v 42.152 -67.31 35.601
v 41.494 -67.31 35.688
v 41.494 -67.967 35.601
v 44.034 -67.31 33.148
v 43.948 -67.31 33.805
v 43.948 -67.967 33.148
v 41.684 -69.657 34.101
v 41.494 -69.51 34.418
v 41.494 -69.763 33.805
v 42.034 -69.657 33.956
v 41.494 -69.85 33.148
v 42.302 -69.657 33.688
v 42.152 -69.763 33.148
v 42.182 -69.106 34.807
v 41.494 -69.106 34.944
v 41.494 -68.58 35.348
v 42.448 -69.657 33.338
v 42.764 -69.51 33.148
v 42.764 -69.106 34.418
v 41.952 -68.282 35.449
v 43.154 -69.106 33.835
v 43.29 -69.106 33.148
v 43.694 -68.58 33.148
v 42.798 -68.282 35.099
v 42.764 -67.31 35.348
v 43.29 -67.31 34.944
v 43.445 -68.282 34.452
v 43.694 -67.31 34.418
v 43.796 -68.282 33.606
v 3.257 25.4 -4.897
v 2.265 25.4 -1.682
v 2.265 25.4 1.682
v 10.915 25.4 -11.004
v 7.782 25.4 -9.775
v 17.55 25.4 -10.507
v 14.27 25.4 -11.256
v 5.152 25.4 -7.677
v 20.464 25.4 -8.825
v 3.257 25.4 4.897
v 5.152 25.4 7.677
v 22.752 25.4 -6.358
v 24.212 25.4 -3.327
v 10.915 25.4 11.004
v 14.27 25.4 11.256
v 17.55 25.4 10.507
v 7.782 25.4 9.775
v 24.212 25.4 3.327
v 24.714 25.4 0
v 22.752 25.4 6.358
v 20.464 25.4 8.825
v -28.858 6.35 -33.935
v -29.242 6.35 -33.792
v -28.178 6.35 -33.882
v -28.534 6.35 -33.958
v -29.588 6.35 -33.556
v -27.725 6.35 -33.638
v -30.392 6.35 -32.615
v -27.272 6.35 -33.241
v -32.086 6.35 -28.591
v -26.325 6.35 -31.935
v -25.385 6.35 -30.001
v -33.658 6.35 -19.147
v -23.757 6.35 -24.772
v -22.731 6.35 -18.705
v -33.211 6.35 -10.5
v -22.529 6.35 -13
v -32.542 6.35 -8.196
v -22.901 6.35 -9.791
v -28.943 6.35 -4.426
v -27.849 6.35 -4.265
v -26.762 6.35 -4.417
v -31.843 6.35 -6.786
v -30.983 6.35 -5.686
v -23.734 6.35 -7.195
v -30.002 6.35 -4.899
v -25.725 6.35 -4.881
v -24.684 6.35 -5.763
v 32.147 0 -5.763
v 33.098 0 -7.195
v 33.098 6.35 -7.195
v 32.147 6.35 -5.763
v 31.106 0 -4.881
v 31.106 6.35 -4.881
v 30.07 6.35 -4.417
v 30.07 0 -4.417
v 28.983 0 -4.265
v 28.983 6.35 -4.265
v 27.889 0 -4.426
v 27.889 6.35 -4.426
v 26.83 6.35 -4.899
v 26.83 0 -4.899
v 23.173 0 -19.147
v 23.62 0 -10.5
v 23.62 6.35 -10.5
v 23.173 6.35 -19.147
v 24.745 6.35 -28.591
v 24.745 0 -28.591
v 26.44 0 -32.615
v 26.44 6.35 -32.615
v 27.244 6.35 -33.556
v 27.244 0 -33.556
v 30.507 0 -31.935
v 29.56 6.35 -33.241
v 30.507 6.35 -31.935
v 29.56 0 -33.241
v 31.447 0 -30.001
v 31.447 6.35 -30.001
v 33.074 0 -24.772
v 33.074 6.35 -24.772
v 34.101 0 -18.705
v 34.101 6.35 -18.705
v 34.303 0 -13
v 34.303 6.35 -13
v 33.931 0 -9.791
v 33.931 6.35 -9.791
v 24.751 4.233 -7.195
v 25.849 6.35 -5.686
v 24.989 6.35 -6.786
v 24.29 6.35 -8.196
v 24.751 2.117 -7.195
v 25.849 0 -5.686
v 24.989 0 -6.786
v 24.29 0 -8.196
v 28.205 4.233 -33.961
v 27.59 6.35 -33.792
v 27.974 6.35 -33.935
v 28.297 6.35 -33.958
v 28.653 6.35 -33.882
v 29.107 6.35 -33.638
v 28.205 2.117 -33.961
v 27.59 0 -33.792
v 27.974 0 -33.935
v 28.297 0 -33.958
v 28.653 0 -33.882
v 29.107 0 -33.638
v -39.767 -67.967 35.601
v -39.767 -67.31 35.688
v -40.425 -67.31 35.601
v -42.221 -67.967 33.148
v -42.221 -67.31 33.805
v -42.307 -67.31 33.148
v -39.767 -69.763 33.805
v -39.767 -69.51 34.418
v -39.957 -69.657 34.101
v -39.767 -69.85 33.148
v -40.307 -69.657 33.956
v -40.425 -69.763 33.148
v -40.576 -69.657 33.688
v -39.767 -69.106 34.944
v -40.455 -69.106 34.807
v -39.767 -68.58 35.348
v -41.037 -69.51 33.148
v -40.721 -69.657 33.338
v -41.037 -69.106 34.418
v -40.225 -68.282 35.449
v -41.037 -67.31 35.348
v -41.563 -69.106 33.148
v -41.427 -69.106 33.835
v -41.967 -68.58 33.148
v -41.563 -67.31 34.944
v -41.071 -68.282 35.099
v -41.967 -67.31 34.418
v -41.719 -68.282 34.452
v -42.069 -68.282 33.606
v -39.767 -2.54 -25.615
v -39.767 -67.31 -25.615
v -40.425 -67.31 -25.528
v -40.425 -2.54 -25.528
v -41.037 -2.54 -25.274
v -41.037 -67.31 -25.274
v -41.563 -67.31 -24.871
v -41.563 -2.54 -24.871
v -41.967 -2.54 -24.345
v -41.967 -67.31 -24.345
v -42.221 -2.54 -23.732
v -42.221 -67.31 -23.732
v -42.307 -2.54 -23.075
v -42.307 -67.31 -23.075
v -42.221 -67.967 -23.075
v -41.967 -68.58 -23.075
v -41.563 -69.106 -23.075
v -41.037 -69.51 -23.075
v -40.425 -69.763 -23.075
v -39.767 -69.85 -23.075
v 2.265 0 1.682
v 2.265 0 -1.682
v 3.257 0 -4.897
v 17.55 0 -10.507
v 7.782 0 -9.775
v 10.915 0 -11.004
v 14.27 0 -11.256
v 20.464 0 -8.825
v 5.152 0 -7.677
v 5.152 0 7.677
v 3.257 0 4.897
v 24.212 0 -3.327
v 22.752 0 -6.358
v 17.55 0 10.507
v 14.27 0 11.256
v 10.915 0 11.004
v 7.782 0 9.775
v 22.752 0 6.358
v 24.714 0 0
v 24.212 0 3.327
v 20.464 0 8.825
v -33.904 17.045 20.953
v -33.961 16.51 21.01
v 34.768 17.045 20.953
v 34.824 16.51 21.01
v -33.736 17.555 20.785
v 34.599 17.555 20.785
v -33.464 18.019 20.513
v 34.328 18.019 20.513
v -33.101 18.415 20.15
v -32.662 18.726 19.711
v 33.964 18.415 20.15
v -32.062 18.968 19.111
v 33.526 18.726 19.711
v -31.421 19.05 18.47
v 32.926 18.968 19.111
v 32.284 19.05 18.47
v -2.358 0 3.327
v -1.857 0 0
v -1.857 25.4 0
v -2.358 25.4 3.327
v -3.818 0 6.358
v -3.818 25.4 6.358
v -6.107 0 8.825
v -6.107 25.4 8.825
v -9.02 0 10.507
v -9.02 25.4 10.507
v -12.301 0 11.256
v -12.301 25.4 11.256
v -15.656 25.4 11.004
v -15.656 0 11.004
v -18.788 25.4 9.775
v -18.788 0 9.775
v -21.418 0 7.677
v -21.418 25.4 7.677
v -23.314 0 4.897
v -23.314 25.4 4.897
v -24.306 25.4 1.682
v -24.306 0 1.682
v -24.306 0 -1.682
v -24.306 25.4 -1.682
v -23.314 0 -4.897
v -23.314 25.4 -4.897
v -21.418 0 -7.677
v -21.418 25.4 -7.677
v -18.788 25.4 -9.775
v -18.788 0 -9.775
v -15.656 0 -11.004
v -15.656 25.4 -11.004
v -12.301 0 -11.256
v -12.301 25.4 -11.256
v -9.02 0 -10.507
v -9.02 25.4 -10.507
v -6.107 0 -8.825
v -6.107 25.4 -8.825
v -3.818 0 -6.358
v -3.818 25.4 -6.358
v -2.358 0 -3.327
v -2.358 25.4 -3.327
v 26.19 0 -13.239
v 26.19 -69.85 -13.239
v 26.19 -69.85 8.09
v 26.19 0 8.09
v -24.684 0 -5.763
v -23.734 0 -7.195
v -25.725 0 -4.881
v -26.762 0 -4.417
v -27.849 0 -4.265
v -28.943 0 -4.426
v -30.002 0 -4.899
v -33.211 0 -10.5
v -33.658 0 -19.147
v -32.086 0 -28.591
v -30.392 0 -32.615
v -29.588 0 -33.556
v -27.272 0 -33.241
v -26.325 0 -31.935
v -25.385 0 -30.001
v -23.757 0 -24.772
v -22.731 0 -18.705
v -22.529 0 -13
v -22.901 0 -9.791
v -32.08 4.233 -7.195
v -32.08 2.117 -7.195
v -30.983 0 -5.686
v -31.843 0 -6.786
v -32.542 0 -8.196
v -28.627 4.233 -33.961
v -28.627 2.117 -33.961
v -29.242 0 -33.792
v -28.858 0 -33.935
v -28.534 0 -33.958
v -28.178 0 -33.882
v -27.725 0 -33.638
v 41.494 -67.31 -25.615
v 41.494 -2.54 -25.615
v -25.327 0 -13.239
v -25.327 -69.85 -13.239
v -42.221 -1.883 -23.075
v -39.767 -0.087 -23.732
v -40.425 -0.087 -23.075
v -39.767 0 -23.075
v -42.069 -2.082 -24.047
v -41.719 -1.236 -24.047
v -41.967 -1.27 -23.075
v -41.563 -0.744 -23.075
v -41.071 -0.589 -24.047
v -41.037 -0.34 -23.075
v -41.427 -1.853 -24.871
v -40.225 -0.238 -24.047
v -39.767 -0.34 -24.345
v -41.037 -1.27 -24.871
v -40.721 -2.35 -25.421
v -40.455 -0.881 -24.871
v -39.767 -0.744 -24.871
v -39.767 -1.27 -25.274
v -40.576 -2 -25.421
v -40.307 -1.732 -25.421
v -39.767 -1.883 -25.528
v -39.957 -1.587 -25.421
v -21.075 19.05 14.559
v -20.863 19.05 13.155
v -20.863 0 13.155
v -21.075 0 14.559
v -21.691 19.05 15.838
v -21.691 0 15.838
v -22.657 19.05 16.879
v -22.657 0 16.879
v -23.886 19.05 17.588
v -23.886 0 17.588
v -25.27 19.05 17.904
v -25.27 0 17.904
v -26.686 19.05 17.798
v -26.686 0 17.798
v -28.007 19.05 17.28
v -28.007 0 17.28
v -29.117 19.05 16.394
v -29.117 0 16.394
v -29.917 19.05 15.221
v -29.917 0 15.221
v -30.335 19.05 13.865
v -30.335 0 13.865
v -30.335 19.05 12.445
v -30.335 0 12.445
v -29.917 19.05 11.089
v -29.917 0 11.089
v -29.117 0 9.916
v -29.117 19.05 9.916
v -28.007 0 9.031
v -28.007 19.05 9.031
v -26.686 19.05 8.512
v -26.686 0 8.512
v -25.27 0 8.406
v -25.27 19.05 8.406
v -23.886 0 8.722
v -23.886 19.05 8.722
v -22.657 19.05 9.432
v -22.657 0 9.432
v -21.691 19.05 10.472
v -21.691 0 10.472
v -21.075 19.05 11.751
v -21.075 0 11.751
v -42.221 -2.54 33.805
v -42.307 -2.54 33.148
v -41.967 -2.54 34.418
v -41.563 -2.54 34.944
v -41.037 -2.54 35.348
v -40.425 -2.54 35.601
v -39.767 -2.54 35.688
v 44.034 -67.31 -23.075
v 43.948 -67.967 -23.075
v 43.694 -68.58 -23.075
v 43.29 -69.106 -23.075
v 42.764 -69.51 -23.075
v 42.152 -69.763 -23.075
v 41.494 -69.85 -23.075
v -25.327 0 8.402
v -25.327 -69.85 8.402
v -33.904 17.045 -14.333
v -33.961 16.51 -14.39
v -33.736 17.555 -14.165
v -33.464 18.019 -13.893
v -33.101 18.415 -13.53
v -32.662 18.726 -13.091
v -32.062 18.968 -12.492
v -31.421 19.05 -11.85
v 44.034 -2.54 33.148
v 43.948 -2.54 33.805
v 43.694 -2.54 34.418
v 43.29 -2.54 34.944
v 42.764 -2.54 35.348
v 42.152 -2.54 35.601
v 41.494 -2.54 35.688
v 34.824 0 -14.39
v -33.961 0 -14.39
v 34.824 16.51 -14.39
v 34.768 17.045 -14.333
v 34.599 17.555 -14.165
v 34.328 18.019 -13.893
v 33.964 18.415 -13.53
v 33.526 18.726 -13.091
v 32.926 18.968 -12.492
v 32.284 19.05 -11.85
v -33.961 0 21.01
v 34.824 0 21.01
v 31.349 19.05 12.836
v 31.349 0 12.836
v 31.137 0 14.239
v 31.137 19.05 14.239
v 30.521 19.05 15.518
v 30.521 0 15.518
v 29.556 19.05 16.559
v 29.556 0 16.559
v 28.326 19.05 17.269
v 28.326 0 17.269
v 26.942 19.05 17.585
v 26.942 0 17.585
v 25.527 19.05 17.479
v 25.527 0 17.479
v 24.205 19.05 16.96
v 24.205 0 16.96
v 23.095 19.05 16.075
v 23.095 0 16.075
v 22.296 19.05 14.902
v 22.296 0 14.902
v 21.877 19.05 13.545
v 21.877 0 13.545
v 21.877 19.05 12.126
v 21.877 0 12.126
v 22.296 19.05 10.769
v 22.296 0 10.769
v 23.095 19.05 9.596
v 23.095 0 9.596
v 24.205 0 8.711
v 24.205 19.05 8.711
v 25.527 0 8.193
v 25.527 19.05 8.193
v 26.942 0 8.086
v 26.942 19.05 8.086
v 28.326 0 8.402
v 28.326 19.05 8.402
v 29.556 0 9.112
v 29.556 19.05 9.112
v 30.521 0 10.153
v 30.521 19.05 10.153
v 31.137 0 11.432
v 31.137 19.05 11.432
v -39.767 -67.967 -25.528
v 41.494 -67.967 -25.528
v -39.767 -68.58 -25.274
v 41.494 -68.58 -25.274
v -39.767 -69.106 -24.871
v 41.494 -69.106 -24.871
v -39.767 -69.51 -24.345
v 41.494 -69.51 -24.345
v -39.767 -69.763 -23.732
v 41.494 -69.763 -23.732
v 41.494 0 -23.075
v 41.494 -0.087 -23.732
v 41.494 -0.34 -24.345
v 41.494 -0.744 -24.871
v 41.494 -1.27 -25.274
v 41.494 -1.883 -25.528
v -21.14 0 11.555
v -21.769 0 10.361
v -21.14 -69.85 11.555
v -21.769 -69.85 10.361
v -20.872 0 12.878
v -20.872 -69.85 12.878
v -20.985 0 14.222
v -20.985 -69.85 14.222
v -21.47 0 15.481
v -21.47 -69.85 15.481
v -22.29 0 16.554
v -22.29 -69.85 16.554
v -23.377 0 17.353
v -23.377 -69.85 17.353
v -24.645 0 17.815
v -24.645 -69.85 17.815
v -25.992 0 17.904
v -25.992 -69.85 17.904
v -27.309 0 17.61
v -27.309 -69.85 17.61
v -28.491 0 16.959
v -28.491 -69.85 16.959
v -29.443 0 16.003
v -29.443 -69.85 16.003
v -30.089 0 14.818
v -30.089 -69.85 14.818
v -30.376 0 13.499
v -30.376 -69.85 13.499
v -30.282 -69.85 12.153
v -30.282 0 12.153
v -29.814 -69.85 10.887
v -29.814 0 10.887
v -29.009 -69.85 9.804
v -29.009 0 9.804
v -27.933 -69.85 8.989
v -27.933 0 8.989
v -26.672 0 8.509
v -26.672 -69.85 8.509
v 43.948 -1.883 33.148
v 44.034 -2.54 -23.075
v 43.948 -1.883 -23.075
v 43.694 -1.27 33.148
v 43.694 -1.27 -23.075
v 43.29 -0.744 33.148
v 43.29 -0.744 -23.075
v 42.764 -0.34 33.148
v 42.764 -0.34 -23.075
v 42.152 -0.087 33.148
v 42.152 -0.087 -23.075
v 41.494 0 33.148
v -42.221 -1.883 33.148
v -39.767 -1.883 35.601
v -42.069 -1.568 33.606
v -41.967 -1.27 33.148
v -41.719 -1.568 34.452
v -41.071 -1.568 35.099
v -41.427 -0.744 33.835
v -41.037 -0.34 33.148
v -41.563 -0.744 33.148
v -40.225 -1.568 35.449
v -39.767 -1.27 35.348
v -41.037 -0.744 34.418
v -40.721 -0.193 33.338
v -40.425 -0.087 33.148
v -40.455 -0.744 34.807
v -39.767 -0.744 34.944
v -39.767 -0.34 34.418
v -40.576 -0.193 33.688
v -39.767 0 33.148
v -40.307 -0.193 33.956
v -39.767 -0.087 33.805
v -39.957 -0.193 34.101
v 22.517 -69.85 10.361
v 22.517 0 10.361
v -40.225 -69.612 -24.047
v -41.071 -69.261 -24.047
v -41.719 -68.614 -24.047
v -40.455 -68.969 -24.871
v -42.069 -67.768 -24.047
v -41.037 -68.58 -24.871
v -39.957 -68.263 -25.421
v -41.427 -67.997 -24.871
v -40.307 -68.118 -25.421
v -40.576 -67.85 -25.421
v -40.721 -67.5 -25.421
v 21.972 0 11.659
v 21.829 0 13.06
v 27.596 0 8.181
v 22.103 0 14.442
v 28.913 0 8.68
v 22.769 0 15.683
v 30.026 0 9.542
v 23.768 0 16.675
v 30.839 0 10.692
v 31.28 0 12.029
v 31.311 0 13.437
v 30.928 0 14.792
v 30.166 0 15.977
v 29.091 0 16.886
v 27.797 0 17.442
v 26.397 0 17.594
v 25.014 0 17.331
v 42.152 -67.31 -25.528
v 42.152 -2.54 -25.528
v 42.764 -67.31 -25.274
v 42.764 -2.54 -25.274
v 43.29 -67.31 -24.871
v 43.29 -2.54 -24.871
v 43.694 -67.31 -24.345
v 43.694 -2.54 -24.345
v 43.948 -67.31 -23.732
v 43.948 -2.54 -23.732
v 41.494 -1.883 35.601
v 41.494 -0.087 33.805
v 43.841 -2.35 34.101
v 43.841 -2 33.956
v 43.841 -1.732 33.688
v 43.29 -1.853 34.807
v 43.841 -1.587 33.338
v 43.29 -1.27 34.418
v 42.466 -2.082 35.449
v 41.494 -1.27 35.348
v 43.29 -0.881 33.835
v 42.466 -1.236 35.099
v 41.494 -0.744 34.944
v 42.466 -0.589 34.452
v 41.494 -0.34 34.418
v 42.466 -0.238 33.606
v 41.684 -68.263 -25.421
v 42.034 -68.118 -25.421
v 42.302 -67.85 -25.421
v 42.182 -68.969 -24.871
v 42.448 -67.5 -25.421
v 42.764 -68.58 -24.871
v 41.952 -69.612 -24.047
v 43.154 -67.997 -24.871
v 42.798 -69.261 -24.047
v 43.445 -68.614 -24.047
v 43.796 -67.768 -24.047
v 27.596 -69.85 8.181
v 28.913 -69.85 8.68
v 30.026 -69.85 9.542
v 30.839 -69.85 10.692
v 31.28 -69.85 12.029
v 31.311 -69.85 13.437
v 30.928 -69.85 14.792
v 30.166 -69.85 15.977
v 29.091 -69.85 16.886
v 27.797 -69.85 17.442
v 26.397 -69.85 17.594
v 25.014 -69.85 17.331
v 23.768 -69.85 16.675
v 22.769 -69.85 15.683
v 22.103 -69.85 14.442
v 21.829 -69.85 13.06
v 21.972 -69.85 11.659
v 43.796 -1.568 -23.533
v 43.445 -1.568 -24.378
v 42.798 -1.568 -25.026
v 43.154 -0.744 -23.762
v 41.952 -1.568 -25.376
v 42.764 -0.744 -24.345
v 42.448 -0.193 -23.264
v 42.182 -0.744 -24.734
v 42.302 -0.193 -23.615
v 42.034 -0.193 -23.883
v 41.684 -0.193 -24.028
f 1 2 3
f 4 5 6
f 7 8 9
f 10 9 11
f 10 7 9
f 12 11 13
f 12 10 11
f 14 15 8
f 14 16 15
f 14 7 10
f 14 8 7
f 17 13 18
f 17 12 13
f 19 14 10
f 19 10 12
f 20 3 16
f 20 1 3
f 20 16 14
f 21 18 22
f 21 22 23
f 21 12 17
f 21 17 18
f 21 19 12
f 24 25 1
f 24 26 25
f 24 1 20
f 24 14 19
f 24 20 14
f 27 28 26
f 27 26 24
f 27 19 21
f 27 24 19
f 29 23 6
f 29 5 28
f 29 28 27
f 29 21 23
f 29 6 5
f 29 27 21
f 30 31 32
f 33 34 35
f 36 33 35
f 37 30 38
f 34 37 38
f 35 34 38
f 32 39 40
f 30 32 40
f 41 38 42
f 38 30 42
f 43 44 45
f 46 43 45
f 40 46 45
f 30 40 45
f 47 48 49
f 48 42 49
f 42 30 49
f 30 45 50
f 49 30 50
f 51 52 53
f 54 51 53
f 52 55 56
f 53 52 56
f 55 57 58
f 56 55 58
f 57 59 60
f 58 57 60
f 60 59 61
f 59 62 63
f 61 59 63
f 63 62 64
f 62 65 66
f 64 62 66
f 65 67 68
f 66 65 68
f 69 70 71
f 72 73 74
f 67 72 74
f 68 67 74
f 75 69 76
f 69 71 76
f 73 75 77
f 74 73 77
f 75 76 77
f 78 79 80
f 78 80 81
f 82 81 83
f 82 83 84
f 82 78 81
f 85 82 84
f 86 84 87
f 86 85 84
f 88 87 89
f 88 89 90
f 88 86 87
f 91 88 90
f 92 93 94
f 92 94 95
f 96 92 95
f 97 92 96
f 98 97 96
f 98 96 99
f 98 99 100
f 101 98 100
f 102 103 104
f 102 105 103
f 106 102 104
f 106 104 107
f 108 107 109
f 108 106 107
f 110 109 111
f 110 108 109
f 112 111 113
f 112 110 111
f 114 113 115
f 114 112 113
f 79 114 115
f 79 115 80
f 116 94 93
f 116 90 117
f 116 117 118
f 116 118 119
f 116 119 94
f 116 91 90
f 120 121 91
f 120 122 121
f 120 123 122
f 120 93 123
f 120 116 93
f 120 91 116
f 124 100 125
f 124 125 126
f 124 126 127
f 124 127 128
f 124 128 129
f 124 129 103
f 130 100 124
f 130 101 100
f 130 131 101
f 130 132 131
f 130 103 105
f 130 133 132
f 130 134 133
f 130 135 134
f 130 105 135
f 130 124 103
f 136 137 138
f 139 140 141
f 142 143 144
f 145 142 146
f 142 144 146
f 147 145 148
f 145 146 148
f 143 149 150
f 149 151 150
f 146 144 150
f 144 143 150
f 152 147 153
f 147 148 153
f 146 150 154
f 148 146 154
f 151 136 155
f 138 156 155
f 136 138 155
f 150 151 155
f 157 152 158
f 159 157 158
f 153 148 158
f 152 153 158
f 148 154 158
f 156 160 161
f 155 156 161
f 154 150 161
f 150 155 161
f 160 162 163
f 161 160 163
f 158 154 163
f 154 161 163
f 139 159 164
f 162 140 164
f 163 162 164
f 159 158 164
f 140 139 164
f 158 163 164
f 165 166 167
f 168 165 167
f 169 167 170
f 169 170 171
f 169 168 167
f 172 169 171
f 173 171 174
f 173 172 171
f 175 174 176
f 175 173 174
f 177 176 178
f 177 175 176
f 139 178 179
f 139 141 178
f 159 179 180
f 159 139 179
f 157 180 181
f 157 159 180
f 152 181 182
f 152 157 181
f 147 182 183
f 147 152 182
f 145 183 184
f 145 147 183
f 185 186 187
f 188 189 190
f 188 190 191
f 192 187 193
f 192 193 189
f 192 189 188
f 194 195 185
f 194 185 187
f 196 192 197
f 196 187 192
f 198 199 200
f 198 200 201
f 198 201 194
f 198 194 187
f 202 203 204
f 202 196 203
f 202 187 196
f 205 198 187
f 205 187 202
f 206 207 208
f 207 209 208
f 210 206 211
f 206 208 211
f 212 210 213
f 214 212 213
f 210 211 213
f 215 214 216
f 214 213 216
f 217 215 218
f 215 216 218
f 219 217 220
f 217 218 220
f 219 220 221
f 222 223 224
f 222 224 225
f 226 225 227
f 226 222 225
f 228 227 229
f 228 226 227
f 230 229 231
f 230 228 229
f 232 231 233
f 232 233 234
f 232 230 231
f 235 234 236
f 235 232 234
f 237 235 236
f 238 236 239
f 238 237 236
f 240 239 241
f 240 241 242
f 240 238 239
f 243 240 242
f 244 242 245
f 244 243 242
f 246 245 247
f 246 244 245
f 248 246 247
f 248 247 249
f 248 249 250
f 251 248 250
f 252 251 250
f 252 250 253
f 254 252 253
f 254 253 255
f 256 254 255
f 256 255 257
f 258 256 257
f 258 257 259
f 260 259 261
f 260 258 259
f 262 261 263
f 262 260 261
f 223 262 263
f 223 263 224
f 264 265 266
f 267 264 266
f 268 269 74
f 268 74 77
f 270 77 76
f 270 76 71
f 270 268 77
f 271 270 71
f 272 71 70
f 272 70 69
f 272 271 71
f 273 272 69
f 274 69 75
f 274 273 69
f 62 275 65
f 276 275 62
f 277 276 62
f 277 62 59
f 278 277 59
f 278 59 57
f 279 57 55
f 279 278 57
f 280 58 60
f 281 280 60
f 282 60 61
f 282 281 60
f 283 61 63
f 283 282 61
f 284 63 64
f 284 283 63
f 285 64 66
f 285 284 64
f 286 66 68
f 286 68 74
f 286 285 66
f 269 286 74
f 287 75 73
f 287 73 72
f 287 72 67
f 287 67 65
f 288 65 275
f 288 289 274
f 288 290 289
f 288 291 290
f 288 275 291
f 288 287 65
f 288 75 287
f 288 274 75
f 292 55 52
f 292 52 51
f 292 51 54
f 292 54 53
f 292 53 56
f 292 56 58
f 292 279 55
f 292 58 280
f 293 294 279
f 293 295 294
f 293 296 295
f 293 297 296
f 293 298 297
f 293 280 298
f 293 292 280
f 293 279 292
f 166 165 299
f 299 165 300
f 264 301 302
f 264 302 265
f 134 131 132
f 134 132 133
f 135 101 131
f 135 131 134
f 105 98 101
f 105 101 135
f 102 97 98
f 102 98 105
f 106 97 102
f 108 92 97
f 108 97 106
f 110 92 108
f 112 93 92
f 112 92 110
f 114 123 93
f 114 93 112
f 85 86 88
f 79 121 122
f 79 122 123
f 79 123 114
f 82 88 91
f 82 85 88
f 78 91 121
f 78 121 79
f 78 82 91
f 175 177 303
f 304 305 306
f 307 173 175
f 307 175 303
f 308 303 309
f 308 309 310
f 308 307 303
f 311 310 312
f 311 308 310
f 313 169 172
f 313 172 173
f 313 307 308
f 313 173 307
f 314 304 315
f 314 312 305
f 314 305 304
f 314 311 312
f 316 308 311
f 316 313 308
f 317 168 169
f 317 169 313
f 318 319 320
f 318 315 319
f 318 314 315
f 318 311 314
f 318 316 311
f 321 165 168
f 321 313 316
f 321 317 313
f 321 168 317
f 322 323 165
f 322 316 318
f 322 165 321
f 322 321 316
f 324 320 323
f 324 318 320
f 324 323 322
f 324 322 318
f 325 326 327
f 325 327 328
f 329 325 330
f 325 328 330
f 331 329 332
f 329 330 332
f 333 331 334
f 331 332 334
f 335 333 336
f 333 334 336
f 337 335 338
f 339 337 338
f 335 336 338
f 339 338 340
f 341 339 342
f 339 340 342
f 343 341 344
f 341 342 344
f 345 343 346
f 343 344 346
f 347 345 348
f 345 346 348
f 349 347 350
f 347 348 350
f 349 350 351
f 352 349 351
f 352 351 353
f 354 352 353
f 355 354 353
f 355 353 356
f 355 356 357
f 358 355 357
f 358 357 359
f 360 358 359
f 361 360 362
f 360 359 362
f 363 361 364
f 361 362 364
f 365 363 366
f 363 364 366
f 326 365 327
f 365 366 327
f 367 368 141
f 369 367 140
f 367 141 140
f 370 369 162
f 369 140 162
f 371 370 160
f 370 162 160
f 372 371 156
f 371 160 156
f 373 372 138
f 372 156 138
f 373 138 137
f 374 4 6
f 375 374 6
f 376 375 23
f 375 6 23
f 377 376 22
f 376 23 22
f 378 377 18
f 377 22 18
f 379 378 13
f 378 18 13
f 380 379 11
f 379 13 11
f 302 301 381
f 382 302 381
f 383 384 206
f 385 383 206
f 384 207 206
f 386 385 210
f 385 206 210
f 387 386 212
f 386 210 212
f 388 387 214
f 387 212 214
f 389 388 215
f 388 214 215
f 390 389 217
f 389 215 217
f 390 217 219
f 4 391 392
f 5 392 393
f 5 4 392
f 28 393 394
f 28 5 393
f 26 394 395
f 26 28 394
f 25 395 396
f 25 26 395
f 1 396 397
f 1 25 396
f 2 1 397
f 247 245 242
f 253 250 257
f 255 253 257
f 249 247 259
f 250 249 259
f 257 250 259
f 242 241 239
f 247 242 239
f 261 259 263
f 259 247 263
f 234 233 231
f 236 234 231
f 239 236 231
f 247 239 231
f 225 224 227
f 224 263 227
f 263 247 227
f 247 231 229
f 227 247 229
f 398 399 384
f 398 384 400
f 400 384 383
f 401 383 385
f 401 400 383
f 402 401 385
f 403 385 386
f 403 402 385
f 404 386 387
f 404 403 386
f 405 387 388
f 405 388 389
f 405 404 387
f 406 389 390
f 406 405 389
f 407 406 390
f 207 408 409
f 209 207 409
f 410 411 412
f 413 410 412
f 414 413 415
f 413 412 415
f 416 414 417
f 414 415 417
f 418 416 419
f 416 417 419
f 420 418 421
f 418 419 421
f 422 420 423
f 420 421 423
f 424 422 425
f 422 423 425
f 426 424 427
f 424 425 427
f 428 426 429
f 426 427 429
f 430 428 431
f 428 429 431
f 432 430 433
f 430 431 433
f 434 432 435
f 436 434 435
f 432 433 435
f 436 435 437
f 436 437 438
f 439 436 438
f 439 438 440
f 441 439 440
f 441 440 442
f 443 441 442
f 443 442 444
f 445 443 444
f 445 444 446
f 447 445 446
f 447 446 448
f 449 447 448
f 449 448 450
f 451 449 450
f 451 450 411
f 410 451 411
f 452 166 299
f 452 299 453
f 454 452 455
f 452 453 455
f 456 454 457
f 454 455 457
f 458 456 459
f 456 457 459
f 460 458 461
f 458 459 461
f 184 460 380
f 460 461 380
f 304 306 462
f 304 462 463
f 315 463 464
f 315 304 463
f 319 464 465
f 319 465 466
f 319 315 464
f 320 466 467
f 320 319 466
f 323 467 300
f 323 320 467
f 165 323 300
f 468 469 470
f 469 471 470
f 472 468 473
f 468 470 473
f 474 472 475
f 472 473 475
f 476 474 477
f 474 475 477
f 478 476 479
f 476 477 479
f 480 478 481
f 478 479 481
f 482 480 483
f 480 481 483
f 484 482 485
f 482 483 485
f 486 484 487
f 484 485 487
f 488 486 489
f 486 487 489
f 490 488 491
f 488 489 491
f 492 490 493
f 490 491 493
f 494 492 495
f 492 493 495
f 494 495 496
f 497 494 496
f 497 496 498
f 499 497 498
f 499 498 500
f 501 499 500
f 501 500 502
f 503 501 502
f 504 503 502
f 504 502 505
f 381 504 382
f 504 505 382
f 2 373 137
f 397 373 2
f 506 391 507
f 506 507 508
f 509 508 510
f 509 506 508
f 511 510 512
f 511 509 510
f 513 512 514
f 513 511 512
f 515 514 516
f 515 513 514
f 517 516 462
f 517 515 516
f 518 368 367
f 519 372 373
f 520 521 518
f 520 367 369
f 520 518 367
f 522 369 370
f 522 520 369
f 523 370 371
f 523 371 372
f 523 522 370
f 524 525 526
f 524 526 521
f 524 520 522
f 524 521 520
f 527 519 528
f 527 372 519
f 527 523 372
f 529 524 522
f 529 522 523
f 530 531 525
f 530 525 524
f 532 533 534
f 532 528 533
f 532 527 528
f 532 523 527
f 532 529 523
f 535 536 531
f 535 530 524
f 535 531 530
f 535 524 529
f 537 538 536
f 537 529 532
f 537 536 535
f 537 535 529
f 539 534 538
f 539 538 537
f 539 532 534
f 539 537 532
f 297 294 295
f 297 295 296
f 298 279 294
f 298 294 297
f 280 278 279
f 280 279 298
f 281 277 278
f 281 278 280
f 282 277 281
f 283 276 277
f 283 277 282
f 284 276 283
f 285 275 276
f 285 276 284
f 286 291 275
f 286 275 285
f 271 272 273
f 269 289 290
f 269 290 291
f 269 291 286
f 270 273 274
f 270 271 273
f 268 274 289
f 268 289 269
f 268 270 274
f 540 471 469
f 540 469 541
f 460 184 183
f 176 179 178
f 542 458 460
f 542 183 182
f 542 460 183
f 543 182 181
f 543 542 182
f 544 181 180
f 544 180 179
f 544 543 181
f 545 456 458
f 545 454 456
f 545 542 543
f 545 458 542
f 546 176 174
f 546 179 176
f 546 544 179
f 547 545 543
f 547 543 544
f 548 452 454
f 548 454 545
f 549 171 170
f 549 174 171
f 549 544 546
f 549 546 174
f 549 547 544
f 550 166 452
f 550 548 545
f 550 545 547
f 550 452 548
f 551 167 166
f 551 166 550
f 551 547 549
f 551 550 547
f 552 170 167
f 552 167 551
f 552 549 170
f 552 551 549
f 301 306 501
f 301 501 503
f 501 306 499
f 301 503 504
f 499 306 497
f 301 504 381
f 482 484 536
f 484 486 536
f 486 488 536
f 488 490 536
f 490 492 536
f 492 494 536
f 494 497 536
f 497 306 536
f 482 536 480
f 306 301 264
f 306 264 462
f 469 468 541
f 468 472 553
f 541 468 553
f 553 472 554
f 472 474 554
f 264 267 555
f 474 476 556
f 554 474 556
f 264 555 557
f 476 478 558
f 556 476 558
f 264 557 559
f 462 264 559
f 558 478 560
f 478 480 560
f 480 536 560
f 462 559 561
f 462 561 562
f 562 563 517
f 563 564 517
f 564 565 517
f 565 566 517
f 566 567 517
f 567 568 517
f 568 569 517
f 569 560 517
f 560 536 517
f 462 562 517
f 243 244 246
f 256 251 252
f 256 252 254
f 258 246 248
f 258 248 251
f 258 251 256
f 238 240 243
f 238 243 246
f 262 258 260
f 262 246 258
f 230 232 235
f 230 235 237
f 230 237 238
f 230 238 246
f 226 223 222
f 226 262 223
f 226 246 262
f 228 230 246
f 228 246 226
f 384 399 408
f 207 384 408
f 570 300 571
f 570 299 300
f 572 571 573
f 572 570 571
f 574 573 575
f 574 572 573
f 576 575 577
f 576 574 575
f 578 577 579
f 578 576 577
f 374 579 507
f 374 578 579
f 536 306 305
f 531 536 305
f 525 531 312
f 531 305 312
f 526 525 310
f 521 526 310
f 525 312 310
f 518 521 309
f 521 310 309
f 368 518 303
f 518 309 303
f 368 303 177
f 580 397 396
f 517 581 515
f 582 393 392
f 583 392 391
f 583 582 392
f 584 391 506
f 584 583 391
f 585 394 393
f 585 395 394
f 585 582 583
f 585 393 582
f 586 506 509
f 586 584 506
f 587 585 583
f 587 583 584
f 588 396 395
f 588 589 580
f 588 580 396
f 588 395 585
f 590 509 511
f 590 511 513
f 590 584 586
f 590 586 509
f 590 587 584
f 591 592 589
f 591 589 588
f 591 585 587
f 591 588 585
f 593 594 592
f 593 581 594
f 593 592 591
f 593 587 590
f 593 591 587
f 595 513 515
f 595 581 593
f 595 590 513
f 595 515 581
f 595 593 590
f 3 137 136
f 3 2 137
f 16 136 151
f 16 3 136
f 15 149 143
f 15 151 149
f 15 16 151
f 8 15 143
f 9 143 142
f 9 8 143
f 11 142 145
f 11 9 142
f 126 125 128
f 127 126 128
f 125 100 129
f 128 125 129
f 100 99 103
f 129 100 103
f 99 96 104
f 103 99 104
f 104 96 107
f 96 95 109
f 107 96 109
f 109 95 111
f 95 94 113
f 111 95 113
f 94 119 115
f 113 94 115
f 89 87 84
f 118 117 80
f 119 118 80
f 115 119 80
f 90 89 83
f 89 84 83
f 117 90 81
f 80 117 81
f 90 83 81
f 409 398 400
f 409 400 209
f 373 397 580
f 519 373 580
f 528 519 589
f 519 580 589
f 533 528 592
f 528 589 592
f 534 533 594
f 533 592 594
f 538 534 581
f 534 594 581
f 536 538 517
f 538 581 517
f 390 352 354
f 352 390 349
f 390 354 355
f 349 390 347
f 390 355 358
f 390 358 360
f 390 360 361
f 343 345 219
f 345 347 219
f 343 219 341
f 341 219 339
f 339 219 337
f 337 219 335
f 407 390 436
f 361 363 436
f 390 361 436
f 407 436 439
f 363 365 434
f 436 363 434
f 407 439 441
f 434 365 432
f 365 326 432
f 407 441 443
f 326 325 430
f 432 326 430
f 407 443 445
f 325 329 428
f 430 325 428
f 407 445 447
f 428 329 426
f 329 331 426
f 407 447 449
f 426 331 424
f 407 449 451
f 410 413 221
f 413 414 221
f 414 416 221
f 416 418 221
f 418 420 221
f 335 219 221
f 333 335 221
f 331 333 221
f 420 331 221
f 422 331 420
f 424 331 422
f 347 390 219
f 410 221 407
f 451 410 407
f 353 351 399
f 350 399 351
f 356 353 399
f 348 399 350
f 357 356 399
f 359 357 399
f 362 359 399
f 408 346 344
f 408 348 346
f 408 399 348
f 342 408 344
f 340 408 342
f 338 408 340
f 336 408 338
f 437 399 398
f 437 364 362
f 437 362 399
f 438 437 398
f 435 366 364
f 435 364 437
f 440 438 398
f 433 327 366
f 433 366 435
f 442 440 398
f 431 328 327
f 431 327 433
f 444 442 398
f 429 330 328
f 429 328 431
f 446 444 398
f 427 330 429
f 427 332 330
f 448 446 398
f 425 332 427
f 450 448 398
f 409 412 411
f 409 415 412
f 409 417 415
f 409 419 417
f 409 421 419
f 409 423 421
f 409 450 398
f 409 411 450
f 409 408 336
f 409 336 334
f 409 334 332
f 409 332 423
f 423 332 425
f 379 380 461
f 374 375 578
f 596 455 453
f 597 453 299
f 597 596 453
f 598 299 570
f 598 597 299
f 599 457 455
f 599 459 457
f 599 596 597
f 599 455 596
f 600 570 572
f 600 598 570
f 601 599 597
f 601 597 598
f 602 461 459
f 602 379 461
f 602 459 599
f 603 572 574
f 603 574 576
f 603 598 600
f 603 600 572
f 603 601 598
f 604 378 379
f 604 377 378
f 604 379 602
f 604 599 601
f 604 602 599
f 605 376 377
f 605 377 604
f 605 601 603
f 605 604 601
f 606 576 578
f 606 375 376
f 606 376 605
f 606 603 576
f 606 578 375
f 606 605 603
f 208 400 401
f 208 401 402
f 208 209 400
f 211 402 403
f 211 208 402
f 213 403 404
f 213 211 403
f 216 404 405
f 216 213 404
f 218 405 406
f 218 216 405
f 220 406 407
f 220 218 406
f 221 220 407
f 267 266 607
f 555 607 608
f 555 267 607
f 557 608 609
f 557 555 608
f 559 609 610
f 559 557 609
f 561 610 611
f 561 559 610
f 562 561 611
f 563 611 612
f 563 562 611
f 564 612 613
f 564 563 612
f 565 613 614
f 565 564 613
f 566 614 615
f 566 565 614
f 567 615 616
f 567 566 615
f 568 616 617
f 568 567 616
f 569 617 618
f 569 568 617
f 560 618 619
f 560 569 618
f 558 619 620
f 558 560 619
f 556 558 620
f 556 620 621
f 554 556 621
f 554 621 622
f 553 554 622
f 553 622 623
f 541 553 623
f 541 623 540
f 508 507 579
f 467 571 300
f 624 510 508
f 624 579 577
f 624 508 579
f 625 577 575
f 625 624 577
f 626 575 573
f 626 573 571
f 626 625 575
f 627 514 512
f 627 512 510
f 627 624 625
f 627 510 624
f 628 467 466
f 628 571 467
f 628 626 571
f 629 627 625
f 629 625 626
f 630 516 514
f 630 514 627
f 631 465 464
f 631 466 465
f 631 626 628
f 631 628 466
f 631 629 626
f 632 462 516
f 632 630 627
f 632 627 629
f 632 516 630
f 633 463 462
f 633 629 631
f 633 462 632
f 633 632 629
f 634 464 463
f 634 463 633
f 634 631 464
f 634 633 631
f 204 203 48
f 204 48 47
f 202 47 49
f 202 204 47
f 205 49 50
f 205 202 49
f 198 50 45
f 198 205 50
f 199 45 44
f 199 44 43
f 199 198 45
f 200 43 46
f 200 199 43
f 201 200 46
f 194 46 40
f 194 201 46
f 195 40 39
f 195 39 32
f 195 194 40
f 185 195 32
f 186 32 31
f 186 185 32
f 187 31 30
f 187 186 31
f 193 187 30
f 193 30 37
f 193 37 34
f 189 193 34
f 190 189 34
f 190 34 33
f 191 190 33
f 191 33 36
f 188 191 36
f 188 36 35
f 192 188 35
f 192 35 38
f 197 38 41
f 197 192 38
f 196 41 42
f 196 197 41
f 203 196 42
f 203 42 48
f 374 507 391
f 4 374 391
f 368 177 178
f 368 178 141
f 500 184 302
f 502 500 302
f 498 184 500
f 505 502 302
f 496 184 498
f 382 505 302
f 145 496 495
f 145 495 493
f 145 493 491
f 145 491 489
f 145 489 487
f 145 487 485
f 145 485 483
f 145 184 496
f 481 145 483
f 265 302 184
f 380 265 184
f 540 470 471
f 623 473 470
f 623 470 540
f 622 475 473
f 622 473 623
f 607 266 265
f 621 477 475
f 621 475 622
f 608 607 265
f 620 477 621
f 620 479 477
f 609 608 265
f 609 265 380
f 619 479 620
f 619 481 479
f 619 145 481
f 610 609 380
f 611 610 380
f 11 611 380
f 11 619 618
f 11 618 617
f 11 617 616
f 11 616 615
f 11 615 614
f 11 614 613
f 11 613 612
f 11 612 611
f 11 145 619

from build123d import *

# Parameters (mm, degrees)
F1_W          = 86.341727525
F1_H          = 61.3026246428
F2_DEPTH      = 69.85
F0_R          = 11.2874637249
F5_DEPTH      = 25.4
F6_DEPTH      = 6.35
F3_W          = 68.7855817378
F3_H          = 35.4001102969
F7_DEPTH      = 19.05
F8_R          = 2.54
F8_2_R        = 2.54
F9_T1_DEPTH   = 65.1126246428
F9_T3_DEPTH   = 90.151727525
F9_S7_W       = 2.54
F9_S7_H       = 2.54
F9_T8_DEPTH   = 2.54
F9_S13_W      = 2.54
F9_S13_H      = 2.54
F9_T14_DEPTH  = 2.54
F10_T1_DEPTH  = 64.77
F10_S5_W      = 2.54
F10_S5_H      = 2.54
F10_T6_DEPTH  = 2.54
F10_S11_W     = 2.54
F10_S11_H     = 2.54
F10_T12_DEPTH = 2.54
F11_R         = 4.7625
F12_DEPTH     = 279.4
F13_W         = 51.5172332525
F13_H         = 23.6000707373
F14_DEPTH     = 101.6


# Not quite as in the source:
# - a fillet or chamfer that OpenCascade refuses, or shapes differently, is made with other operations: its cross-section is extruded or revolved along the edge and cut away or added


with BuildPart() as f2:
    # F1 (on Front) → F2 (new body)
    with BuildSketch(Plane.XZ):
        with Locations((0.8634161204, 5.0365999341)):
            Rectangle(F1_W, F1_H)
    extrude(amount=F2_DEPTH)

    # F8
    f8_edges = [f2.edges().sort_by_distance(p)[0] for p in [
        (-42.307448, -34.925, 35.687912),
        (0.863416, 0, 35.687912),
        (44.03428, -34.925, 35.687912),
        (0.863416, -69.85, 35.687912),
        (44.03428, -69.85, 5.0366),
        (-42.307448, -69.85, 5.0366),
        (0.863416, -69.85, -25.614712),
        (44.03428, -34.925, -25.614712),
        (44.03428, 0, 5.0366),
    ]]
    fillet(f8_edges, radius=F8_R)

    # F9: fillet of radius 2.54 on 2 edges, made by hand

    # F9_s2 → F9_t1 (cut)
    with BuildSketch(Plane.XY.offset(-31.9647123873)):
        with BuildLine():
            ThreePointArc((-39.7674476421, 0), (-41.5634988663, -0.7439487758), (-42.3074476421, -2.54))
            Line((-42.3074476421, -2.54), (-42.3074476421, 0))
            Line((-42.3074476421, 0), (-39.7674476421, 0))
        make_face()
    extrude(amount=F9_T1_DEPTH, mode=Mode.SUBTRACT)

    # F9_s4 → F9_t3 (cut)
    with BuildSketch(Plane.YZ.offset(-48.6574476421)):
        with BuildLine():
            ThreePointArc((0, -23.0747123873), (-0.7439487758, -24.8707636115), (-2.54, -25.6147123873))
            Line((-2.54, -25.6147123873), (0, -25.6147123873))
            Line((0, -25.6147123873), (0, -23.0747123873))
        make_face()
    extrude(amount=F9_T3_DEPTH, mode=Mode.SUBTRACT)


with BuildPart() as f5:
    # F0 (on Front) → F5 (new body)
    with BuildSketch(Plane.XZ):
        with Locations((-13.1441846499, 0)):
            Circle(F0_R)
    extrude(amount=-F5_DEPTH)


with BuildPart() as f5b:
    # F0 (on Front) → F5, piece 2 (new body)
    with BuildSketch(Plane.XZ):
        with Locations((13.4262019347, 0)):
            Circle(F0_R)
    extrude(amount=-F5_DEPTH)


with BuildPart() as f6:
    # F4 (on Front) → F6 (new body)
    with BuildSketch(Plane.XZ):
        with BuildLine():
            add(Edge.make_bspline(
                [(33.0976620317, -7.1951444261), (31.1890209887, -3.2906266132), (19.0840525939, -3.2757250199), (27.6928798629, -53.6869881743), (36.5438211862, -14.2449717651), (33.0976620317, -7.1951444261)],
                knots=[0, 0, 0, 0, 0.2172144581, 0.6078070332, 1, 1, 1, 1], degree=3))
        make_face()
    extrude(amount=-F6_DEPTH)


with BuildPart() as f6b:
    # F4 (on Front) → F6, piece 2 (new body)
    with BuildSketch(Plane.XZ):
        with BuildLine():
            add(Edge.make_bspline(
                [(-23.7341076136, -7.1951444261), (-25.6427486565, -3.2906266132), (-37.7477170514, -3.2757250199), (-29.1388897823, -53.6869881743), (-20.287948459, -14.2449717651), (-23.7341076136, -7.1951444261)],
                knots=[0, 0, 0, 0, 0.2172144581, 0.6078070332, 1, 1, 1, 1], degree=3))
        make_face()
    extrude(amount=-F6_DEPTH)


with BuildPart() as f7:
    # F3 (on Front) → F7 (new body)
    with BuildSketch(Plane.XZ):
        with Locations((0.4317071289, 3.3097662963)):
            Rectangle(F3_W, F3_H)
    extrude(amount=-F7_DEPTH)

    # F8#2
    f8_2_edges = [f7.edges().sort_by_distance(p)[0] for p in [
        (0.431707, 19.05, 21.009821),
        (-33.961084, 19.05, 3.309766),
        (0.431707, 19.05, -14.390289),
        (34.824498, 19.05, 3.309766),
    ]]
    fillet(f8_2_edges, radius=F8_2_R)


with BuildPart() as f9_tool6:
    # F9_s7 → F9_t8 (new body)
    with BuildSketch(Plane.XZ.offset(2.54)):
        with Locations((42.7642798829, -24.3447123873)):
            Rectangle(F9_S7_W, F9_S7_H)
    extrude(amount=-F9_T8_DEPTH)

    # F9_s9 → F9_t10 (revolve, cut)
    with BuildSketch(Plane(origin=(41.4942798829, -2.54, -23.0747123873), x_dir=(-0.7071067812, 0, 0.7071067812), z_dir=(-0.7071067812, 0, -0.7071067812))):
        with BuildLine():
            ThreePointArc((0, -2.54), (2.54, 0), (0, 2.54))
            Line((0, 2.54), (0, -2.54))
        make_face()
    revolve(axis=Axis((41.4942798829, -2.54, -23.0747123873), (0, 1, 0)), mode=Mode.SUBTRACT)


with BuildPart() as f2_1:
    add(f2.part)

    # F9_t5: cut F9_tool6
    add(f9_tool6.part, mode=Mode.SUBTRACT)


with BuildPart() as f9_tool12:
    # F9_s13 → F9_t14 (new body)
    with BuildSketch(Plane.XZ.offset(2.54)):
        with Locations((-41.0374476421, 34.4179122555)):
            Rectangle(F9_S13_W, F9_S13_H)
    extrude(amount=-F9_T14_DEPTH)

    # F9_s15 → F9_t16 (revolve, cut)
    with BuildSketch(Plane(origin=(-39.7674476421, -2.54, 33.1479122555), x_dir=(0.7071067812, 0, -0.7071067812), z_dir=(0.7071067812, 0, 0.7071067812))):
        with BuildLine():
            ThreePointArc((0, -2.54), (2.54, 0), (0, 2.54))
            Line((0, 2.54), (0, -2.54))
        make_face()
    revolve(axis=Axis((-39.7674476421, -2.54, 33.1479122555), (0, 1, 0)), mode=Mode.SUBTRACT)


with BuildPart() as f2_2:
    add(f2_1.part)

    # F9_t11: cut F9_tool12
    add(f9_tool12.part, mode=Mode.SUBTRACT)

    # F10: fillet of radius 2.54 on 1 edges, made by hand

    # F10_s2 → F10_t1 (cut)
    with BuildSketch(Plane.XZ.offset(2.54)):
        with BuildLine():
            ThreePointArc((-39.7674476421, -25.6147123873), (-41.5634988663, -24.8707636115), (-42.3074476421, -23.0747123873))
            Line((-42.3074476421, -23.0747123873), (-42.3074476421, -25.6147123873))
            Line((-42.3074476421, -25.6147123873), (-39.7674476421, -25.6147123873))
        make_face()
    extrude(amount=F10_T1_DEPTH, mode=Mode.SUBTRACT)


with BuildPart() as f10_tool4:
    # F10_s5 → F10_t6 (new body)
    with BuildSketch(Plane.XY.offset(-23.0747123873)):
        with Locations((-41.0374476421, -1.27)):
            Rectangle(F10_S5_W, F10_S5_H)
    extrude(amount=-F10_T6_DEPTH)

    # F10_s7 → F10_t8 (revolve, cut)
    with BuildSketch(Plane(origin=(-39.7674476421, -2.54, -23.0747123873), x_dir=(0.7071067812, -0.7071067812, 0), z_dir=(0.7071067812, 0.7071067812, 0))):
        with BuildLine():
            ThreePointArc((0, -2.54), (2.54, 0), (0, 2.54))
            Line((0, 2.54), (0, -2.54))
        make_face()
    revolve(axis=Axis((-39.7674476421, -2.54, -23.0747123873), (0, 0, -1)), mode=Mode.SUBTRACT)


with BuildPart() as f2_3:
    add(f2_2.part)

    # F10_t3: cut F10_tool4
    add(f10_tool4.part, mode=Mode.SUBTRACT)


with BuildPart() as f10_tool10:
    # F10_s11 → F10_t12 (new body)
    with BuildSketch(Plane.XY.offset(-23.0747123873)):
        with Locations((-41.0374476421, -68.58)):
            Rectangle(F10_S11_W, F10_S11_H)
    extrude(amount=-F10_T12_DEPTH)

    # F10_s13 → F10_t14 (revolve, cut)
    with BuildSketch(Plane(origin=(-39.7674476421, -67.31, -23.0747123873), x_dir=(0.7071067812, 0.7071067812, 0), z_dir=(-0.7071067812, 0.7071067812, 0))):
        with BuildLine():
            ThreePointArc((0, -2.54), (2.54, 0), (0, 2.54))
            Line((0, 2.54), (0, -2.54))
        make_face()
    revolve(axis=Axis((-39.7674476421, -67.31, -23.0747123873), (0, 0, -1)), mode=Mode.SUBTRACT)


with BuildPart() as f2_4:
    add(f2_3.part)

    # F10_t9: cut F10_tool10
    add(f10_tool10.part, mode=Mode.SUBTRACT)


with BuildPart() as f12_tool:
    # F11 (on Front) → F12 (new body, symmetric)
    with BuildSketch(Plane.XZ):
        with Locations((26.5864427257, 12.8356372612)):
            Circle(F11_R)
        with Locations((-25.6259300993, 13.1550712943)):
            Circle(F11_R)
    extrude(amount=F12_DEPTH, both=True)


with BuildPart() as f2_5:
    add(f2_4.part)

    # F12: cut by f12_tool
    add(f12_tool.part, mode=Mode.SUBTRACT)

    # F13 (on Front) → F14 (cut)
    with BuildSketch(Plane.XZ):
        with Locations((0.4317108542, -1.4390288852)):
            Rectangle(F13_W, F13_H)
    extrude(amount=F14_DEPTH, mode=Mode.SUBTRACT)


with BuildPart() as f7_1:
    add(f7.part)

    # F12: cut by f12_tool
    add(f12_tool.part, mode=Mode.SUBTRACT)


solid = Compound([f5.part, f5b.part, f6.part, f6b.part, f2_5.part, f7_1.part])
